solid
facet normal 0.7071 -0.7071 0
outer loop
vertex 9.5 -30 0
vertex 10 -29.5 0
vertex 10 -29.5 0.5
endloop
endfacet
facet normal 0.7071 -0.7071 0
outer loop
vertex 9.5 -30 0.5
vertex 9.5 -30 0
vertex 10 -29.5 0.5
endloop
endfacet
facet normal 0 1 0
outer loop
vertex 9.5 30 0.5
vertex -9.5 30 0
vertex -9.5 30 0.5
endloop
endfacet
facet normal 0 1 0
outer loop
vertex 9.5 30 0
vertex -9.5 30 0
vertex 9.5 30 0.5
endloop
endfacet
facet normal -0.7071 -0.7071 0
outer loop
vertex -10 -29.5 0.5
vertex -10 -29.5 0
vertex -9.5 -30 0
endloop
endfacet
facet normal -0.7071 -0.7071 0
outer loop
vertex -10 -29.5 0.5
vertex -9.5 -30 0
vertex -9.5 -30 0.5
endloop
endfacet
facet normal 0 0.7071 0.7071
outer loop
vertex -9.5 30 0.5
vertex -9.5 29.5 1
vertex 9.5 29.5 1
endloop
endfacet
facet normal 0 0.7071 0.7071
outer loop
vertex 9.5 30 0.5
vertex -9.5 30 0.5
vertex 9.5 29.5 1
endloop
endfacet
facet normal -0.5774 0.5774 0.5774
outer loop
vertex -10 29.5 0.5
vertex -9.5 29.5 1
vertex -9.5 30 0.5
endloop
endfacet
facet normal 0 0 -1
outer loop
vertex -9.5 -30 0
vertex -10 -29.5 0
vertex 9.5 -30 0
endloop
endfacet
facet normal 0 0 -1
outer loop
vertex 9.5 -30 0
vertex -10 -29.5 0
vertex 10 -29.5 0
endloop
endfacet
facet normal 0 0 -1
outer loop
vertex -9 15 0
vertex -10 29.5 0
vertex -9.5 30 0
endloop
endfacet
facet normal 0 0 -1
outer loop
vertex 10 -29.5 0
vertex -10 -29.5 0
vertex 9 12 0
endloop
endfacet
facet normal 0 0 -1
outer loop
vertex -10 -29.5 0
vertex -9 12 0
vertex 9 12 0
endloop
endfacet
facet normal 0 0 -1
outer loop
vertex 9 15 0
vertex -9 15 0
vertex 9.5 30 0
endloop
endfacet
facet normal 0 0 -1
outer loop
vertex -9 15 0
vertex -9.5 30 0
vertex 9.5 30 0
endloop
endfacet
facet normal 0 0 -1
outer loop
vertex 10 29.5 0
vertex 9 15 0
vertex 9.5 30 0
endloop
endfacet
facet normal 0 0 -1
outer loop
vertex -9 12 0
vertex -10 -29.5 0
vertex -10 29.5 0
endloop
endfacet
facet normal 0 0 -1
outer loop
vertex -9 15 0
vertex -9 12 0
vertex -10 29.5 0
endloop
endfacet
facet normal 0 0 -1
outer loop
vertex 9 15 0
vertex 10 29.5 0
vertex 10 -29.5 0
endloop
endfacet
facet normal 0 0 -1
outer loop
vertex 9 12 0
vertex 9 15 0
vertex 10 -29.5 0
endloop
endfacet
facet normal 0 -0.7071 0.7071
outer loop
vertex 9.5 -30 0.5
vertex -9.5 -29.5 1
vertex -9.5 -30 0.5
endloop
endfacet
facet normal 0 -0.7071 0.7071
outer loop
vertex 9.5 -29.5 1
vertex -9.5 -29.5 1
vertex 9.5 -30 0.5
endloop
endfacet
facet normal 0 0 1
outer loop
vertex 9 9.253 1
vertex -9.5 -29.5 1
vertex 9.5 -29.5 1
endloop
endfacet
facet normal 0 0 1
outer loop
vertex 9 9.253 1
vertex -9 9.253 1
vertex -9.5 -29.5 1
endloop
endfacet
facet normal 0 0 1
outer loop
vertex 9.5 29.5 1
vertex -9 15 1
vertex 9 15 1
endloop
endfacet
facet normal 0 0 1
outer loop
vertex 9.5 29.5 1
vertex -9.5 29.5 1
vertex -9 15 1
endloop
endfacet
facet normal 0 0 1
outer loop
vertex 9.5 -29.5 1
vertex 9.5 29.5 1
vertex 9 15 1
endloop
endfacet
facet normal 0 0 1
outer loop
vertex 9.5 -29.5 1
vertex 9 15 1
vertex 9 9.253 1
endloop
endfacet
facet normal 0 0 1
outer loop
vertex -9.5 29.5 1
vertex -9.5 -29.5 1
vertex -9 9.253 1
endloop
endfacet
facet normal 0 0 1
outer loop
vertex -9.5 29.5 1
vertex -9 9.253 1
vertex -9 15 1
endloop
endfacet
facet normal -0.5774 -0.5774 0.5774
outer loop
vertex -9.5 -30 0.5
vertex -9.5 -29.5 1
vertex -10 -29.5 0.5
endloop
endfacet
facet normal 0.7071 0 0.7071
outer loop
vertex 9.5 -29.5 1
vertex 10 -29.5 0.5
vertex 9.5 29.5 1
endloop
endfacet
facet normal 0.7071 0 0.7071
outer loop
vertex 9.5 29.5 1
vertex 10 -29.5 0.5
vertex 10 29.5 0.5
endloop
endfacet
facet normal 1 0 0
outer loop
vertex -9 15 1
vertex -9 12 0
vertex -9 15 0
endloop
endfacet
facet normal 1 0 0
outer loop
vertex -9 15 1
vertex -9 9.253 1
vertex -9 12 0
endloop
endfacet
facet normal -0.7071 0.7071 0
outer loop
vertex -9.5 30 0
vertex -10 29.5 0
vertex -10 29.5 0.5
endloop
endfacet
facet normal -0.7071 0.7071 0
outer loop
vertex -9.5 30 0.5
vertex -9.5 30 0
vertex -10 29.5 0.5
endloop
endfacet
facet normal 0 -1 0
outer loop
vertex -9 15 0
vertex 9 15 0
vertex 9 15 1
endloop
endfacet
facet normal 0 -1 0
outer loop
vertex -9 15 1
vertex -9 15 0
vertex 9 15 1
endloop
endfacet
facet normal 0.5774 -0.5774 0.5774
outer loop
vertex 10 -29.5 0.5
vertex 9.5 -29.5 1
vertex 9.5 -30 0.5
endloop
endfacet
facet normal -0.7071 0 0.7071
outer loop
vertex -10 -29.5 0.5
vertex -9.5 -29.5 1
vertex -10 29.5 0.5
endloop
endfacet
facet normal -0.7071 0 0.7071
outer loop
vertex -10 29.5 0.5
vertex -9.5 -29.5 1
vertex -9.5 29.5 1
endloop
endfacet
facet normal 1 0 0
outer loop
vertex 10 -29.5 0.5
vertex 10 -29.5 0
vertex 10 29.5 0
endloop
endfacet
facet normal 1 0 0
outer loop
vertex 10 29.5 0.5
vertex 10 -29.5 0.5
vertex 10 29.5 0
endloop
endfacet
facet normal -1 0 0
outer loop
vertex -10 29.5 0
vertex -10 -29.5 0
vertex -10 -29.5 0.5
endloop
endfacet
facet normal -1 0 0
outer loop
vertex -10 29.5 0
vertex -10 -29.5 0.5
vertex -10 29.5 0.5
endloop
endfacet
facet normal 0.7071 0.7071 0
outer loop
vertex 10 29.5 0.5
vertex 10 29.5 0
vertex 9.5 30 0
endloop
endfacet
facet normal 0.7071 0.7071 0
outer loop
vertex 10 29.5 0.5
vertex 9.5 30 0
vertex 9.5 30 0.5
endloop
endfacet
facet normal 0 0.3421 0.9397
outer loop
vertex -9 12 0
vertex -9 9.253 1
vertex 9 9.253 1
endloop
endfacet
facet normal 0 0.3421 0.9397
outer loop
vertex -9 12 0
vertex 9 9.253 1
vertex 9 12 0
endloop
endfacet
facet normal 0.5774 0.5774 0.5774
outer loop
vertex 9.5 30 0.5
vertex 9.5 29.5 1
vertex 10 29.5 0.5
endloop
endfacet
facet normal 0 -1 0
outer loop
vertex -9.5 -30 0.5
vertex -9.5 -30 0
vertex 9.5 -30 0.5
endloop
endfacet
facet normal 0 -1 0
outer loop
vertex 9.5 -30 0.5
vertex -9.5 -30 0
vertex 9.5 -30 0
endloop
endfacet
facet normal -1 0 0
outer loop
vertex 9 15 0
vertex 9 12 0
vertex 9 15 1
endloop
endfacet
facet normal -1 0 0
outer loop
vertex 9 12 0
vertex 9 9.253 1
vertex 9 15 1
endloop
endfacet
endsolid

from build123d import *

# Parameters (mm, degrees)
F0_W     = 20
F0_H     = 60
F1_DEPTH = 1
F3_DEPTH = 9
F4_SIZE  = 0.5


with BuildPart() as f1:
    # F0 (on Top) → F1 (new body)
    with BuildSketch(Plane.XY):
        Rectangle(F0_W, F0_H)
    extrude(amount=F1_DEPTH)

    # F2 (on Right) → F3 (cut, symmetric)
    with BuildSketch(Plane.YZ):
        Polygon((9.252523, 1), (12, 0), (15, 0), (15, 1), align=None)
    extrude(amount=F3_DEPTH, both=True, mode=Mode.SUBTRACT)

    # F4
    f4_edges = [f1.edges().sort_by_distance(p)[0] for p in [
        (10, 0, 1),
        (0, -30, 1),
        (-10, 0, 1),
        (0, 30, 1),
        (10, -30, 0.5),
        (10, 30, 0.5),
        (-10, 30, 0.5),
        (-10, -30, 0.5),
    ]]
    chamfer(f4_edges, length=F4_SIZE)


solid = f1.part
